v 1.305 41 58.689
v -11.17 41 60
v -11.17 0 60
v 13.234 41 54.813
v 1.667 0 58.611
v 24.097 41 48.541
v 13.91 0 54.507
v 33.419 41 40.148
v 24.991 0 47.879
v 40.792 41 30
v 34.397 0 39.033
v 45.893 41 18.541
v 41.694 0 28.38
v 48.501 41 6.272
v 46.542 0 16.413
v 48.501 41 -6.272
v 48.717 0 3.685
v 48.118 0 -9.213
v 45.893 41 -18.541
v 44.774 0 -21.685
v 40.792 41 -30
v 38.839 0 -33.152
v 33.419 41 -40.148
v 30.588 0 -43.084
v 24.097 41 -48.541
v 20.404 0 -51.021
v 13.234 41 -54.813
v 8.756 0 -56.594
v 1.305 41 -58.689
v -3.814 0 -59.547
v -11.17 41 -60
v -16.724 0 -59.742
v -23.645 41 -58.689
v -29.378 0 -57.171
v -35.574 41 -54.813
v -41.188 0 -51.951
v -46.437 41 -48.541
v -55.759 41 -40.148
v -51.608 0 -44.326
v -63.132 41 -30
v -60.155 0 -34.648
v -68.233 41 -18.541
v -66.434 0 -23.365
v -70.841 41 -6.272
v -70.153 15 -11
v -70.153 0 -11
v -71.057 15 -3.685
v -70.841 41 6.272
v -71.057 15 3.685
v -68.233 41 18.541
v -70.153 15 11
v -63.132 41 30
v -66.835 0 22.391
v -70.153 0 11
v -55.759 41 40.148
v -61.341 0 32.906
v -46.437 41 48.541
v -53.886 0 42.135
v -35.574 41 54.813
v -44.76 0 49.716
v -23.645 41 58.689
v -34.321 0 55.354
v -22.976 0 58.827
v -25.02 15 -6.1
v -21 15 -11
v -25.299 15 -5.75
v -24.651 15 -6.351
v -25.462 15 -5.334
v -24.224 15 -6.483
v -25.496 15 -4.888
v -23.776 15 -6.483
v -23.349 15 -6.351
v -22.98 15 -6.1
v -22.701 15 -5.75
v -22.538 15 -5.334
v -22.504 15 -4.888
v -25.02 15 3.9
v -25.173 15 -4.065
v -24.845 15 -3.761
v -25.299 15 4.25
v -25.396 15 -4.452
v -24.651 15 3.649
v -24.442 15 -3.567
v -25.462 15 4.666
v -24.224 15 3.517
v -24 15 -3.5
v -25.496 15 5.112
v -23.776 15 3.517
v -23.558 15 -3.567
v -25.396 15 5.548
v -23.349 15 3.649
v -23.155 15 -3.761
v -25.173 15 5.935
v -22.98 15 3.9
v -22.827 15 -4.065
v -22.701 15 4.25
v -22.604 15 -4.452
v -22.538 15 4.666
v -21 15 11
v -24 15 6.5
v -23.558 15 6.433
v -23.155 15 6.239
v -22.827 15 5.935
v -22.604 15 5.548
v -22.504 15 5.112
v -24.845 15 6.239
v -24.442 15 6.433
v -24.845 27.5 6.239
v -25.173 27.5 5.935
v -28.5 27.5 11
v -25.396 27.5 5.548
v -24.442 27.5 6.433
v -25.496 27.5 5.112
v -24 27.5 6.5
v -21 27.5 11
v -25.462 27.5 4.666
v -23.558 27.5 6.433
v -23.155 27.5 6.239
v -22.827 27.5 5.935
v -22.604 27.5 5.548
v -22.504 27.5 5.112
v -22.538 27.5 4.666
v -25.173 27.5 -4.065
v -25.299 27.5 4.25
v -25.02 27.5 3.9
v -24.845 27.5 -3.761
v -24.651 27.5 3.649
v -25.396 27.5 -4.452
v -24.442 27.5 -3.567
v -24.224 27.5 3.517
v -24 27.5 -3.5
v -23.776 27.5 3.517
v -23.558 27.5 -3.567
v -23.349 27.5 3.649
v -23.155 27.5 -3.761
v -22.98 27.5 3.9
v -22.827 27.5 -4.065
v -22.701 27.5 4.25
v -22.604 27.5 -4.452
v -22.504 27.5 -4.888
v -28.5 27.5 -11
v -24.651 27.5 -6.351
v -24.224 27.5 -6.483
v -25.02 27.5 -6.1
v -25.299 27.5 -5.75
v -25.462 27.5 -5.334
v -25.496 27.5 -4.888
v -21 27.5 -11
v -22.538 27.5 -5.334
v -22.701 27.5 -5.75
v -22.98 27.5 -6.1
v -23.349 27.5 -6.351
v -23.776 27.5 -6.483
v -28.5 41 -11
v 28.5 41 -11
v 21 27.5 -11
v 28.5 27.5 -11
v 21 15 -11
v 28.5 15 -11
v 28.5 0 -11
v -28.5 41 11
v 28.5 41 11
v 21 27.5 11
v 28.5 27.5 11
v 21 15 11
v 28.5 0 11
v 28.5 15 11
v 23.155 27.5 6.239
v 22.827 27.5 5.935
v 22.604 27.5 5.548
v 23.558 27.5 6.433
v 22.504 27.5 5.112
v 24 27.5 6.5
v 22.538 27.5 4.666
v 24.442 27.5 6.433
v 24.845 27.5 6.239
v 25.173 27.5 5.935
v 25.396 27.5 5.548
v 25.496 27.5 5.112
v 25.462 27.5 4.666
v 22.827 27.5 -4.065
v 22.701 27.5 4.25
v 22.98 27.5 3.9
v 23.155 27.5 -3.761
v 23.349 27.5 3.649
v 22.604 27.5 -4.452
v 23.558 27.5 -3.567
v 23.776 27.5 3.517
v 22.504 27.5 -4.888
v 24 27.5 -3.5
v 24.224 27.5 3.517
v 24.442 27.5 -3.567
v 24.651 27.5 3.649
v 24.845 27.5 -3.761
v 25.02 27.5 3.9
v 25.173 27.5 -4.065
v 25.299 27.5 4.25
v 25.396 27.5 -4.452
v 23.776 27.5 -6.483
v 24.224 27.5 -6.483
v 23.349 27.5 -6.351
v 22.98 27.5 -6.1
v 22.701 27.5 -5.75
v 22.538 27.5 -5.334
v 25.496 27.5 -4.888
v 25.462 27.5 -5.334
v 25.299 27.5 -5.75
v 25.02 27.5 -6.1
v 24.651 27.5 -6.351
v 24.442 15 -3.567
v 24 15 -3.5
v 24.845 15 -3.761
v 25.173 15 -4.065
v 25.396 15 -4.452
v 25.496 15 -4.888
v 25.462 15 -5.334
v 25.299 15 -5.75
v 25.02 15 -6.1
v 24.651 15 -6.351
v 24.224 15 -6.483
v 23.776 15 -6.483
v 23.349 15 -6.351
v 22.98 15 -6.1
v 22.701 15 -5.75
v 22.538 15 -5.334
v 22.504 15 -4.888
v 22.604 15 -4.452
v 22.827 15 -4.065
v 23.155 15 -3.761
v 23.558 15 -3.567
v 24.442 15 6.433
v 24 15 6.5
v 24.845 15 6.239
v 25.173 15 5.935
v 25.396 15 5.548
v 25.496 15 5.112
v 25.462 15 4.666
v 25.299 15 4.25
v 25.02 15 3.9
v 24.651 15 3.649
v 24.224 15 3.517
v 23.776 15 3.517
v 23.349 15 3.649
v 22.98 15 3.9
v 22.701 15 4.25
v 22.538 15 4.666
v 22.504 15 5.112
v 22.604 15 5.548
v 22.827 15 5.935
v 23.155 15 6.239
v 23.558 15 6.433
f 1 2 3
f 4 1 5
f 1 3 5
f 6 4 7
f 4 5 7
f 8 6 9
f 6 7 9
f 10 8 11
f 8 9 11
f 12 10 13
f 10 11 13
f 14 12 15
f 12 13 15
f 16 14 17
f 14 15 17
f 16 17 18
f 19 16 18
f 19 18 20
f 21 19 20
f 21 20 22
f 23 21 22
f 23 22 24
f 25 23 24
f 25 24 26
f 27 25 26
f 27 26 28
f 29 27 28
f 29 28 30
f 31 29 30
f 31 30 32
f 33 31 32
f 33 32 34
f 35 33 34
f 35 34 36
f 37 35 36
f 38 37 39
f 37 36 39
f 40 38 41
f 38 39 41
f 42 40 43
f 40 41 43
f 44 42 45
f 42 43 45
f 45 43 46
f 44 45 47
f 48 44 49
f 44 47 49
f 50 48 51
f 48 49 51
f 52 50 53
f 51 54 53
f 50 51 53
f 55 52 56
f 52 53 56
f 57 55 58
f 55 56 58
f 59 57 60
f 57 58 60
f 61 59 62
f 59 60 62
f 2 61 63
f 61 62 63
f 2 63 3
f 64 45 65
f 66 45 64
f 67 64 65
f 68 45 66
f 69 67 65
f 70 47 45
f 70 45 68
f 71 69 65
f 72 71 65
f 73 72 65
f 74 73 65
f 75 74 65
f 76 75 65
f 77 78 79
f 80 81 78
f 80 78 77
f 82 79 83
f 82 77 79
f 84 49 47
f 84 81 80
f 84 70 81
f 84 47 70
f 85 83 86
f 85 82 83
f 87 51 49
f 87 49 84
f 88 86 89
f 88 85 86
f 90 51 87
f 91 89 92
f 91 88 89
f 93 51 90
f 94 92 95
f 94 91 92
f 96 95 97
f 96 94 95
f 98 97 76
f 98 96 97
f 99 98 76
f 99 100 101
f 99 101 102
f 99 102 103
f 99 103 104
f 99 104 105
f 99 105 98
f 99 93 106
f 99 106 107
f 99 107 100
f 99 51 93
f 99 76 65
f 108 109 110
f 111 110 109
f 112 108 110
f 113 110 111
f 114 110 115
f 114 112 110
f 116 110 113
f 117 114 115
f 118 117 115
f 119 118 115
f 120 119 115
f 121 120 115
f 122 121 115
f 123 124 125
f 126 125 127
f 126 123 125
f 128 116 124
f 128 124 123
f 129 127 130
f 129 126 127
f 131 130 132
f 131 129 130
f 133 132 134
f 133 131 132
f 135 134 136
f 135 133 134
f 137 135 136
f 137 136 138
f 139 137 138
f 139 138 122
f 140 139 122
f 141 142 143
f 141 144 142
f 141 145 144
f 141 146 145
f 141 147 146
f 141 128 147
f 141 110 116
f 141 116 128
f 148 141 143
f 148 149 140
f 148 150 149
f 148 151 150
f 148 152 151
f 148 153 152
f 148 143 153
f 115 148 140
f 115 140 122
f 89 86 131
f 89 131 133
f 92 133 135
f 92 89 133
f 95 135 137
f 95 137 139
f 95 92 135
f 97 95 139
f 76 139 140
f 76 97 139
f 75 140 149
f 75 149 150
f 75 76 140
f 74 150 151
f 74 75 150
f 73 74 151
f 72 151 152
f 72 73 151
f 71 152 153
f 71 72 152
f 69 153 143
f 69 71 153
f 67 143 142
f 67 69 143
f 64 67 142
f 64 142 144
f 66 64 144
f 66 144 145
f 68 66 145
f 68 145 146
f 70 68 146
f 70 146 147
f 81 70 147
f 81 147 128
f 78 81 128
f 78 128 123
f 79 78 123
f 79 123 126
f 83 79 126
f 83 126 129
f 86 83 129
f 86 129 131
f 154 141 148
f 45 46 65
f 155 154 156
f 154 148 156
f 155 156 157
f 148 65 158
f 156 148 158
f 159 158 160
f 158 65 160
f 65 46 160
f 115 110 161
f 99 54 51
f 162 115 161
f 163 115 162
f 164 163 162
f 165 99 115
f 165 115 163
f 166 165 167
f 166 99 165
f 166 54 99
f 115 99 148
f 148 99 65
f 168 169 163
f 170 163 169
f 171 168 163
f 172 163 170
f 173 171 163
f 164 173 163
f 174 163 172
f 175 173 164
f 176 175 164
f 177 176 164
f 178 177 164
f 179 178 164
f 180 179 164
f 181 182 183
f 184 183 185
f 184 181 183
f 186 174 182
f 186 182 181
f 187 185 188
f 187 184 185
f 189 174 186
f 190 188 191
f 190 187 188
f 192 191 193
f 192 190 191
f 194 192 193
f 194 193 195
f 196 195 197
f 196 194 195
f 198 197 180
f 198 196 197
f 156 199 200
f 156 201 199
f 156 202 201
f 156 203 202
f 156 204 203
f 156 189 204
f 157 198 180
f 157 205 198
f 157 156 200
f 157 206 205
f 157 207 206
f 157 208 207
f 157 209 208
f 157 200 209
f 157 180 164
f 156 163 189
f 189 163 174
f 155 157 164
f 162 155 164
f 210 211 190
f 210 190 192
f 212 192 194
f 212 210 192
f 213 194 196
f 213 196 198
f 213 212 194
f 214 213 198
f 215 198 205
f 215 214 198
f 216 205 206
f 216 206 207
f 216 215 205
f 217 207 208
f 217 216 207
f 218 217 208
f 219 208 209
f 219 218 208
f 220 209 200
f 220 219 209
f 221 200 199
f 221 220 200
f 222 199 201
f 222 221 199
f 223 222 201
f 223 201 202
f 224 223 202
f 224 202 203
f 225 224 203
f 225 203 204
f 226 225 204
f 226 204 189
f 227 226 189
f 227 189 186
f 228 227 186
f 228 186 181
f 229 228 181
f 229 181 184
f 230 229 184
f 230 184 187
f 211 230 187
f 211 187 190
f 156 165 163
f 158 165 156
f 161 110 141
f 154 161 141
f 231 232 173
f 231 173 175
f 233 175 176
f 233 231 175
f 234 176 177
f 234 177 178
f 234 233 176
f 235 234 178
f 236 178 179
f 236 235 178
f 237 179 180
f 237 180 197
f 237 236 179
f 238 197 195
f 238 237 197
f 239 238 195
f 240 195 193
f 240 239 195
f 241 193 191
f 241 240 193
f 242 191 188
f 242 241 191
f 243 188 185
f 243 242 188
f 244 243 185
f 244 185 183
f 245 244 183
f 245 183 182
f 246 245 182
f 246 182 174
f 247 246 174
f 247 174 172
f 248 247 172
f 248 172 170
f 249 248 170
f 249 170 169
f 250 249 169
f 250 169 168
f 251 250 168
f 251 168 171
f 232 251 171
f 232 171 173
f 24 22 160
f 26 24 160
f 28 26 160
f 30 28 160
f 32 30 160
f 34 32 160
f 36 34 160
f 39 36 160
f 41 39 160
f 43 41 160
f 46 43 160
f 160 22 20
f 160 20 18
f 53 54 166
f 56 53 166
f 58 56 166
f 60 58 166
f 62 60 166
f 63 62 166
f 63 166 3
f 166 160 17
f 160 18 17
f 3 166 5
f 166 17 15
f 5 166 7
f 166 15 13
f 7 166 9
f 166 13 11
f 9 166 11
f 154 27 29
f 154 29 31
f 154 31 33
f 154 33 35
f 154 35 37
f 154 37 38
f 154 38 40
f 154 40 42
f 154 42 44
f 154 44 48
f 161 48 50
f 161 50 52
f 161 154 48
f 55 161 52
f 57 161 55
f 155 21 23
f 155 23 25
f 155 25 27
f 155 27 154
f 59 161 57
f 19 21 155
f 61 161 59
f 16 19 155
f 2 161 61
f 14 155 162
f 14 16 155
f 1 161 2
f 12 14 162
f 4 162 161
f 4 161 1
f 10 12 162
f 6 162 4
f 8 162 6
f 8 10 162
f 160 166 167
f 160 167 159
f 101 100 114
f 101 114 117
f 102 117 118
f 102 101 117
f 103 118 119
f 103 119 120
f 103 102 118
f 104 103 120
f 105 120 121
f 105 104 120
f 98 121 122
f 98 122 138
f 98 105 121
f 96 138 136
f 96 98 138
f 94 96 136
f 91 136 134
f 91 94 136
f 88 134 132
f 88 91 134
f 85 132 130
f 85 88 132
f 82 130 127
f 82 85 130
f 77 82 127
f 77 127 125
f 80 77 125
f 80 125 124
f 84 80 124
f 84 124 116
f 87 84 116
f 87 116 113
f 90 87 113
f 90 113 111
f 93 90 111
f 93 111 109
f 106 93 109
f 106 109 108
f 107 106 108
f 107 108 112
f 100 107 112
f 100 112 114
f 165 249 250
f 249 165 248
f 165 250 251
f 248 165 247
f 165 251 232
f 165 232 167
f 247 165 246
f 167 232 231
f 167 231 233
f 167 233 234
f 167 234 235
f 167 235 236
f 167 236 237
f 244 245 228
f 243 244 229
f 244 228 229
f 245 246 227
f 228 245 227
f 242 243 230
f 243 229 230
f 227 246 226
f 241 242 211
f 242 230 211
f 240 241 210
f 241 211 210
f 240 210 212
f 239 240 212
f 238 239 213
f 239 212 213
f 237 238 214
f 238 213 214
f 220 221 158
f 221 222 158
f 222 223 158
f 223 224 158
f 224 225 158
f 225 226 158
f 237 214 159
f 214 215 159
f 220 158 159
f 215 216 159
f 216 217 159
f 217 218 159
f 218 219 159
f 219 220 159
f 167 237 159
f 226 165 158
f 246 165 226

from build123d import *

# Parameters (mm, degrees)
SKETCH1_W             = 7.5
SKETCH1_H             = 22
SKETCH1_R             = 1.5
BOSS_EXTRUDE2_DEPTH   = 27.5
BOSS_EXTRUDE2_2_DEPTH = 27.5
SKETCH1_5_R           = 60
BOSS_EXTRUDE3_DEPTH   = 41
SKETCH1_7_W           = 7.5
SKETCH1_7_H           = 22
SKETCH1_7_R           = 1.5
CUT_EXTRUDE1_DEPTH    = 15
SKETCH2_W             = 56.358839631
SKETCH2_H             = 22
CUT_EXTRUDE2_DEPTH    = 15


with BuildPart() as part:
    # Sketch1 → Boss-Extrude2 (new body)
    with BuildSketch(Plane(origin=(0, 0, 0), x_dir=(1, 0, 0), z_dir=(0, 1, 0))):
        with Locations((24.75, 0)):
            Rectangle(SKETCH1_W, SKETCH1_H)
        with Locations((24, -5)):
            Circle(SKETCH1_R, mode=Mode.SUBTRACT)
        with Locations((24, 5)):
            Circle(SKETCH1_R, mode=Mode.SUBTRACT)
    extrude(amount=BOSS_EXTRUDE2_DEPTH)



with BuildPart() as body_2:
    # Sketch1 → Boss-Extrude2 2 (new body)
    with BuildSketch(Plane(origin=(0, 0, 0), x_dir=(1, 0, 0), z_dir=(0, 1, 0))):
        with Locations((-24.75, 0)):
            Rectangle(SKETCH1_W, SKETCH1_H)
        with Locations((-24, -5)):
            Circle(SKETCH1_R, mode=Mode.SUBTRACT)
        with Locations((-24, 5)):
            Circle(SKETCH1_R, mode=Mode.SUBTRACT)
    extrude(amount=BOSS_EXTRUDE2_2_DEPTH)


with BuildPart() as part_1:
    add(part.part)

    add(body_2.part)  # Boss-Extrude3 merges body 2
    # Sketch1<5> → Boss-Extrude3 (add)
    with BuildSketch(Plane(origin=(0, 0, 0), x_dir=(1, 0, 0), z_dir=(0, 1, 0))):
        with Locations((-11.17, 0)):
            Circle(SKETCH1_5_R)
        Polygon((28.5, -11), (21, -11), (-21, -11), (-28.5, -11), (-28.5, 11), (-21, 11), (21, 11), (28.5, 11), align=None, mode=Mode.SUBTRACT)
    extrude(amount=BOSS_EXTRUDE3_DEPTH)

    # Sketch1<7> → Cut-Extrude1 (cut)
    # profile 1 of 2: a face of its own
    with BuildSketch(Plane(origin=(0, 0, 0), x_dir=(1, 0, 0), z_dir=(0, 1, 0))):
        with Locations((24.75, 0)):
            Rectangle(SKETCH1_7_W, SKETCH1_7_H)
        with Locations((24, -5)):
            Circle(SKETCH1_7_R, mode=Mode.SUBTRACT)
        with Locations((24, 5)):
            Circle(SKETCH1_7_R, mode=Mode.SUBTRACT)
    # profile 2 of 2: a face of its own
    with BuildSketch(Plane(origin=(0, 0, 0), x_dir=(1, 0, 0), z_dir=(0, 1, 0))):
        with Locations((-24.75, 0)):
            Rectangle(SKETCH1_7_W, SKETCH1_7_H)
        with Locations((-24, -5)):
            Circle(SKETCH1_7_R, mode=Mode.SUBTRACT)
        with Locations((-24, 5)):
            Circle(SKETCH1_7_R, mode=Mode.SUBTRACT)
    extrude(amount=CUT_EXTRUDE1_DEPTH, mode=Mode.SUBTRACT)

    # Sketch2 → Cut-Extrude2 (cut)
    with BuildSketch(Plane.XZ):
        with Locations((-56.679419816, 0)):
            Rectangle(SKETCH2_W, SKETCH2_H)
    extrude(amount=-CUT_EXTRUDE2_DEPTH, mode=Mode.SUBTRACT)


solid = part_1.part
